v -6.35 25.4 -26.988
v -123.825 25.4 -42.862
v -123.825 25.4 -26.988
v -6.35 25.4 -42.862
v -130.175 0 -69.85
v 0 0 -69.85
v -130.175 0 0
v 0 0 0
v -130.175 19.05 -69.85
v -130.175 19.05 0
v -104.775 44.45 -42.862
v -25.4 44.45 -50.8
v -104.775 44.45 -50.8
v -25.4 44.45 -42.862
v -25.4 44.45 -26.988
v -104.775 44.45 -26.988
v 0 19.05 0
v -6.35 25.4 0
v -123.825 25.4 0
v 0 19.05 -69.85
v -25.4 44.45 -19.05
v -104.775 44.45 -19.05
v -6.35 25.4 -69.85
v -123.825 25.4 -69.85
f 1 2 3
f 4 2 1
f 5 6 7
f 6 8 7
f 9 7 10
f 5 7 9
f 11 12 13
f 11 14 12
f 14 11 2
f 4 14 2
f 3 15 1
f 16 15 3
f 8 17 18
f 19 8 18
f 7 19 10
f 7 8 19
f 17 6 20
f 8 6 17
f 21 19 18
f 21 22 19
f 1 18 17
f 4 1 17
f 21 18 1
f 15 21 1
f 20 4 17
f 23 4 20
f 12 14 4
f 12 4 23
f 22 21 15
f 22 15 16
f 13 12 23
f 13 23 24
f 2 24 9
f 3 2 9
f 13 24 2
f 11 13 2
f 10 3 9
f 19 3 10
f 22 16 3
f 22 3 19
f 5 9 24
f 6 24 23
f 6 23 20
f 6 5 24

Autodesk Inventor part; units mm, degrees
ref_plane "YZ Plane" through (0, 0, 0) normal (1, 0, 0) x (0, 1, 0)
ref_plane "XZ Plane" through (0, 0, 0) normal (0, 1, 0) x (-1, 0, 0)
ref_plane "XY Plane" through (0, 0, 0) normal (0, 0, 1) x (1, 0, 0)
sketch "Sketch1" plane through (0, 0, 0) normal (0, 1, 0) x (-1, 0, 0)
  line L0 (0, 0) -> (130.175, 0)
  line L1 (130.175, 0) -> (130.175, -69.85)
  line L2 (130.175, -69.85) -> (0, -69.85)
  line L3 (0, -69.85) -> (0, 0)
  dimension "d0" = 130.175
  dimension "d1" = 69.85
extrude "Extrusion1" add sketch "Sketch1" along normal blind 44.45
sketch "Sketch2" plane through (0, 44.45, 0) normal (0, 1, 0) x (1, 0, 0)
  line L0 (0, 0) -> (0, 69.85) projected
  line L1 (0, 0) -> (0, 34.925)
  line L2 (0, 34.925) -> (-130.175, 34.925)
  line L3 (-130.175, 69.85) -> (-130.175, 0) projected
  line L4 (-130.175, 34.925) -> (0, 34.925)
  line L5 (0, 34.925) -> (0, 26.9875)
  line L6 (0, 26.9875) -> (-130.175, 26.9875)
  line L7 (-130.175, 26.9875) -> (-130.175, 34.925)
  line L8 (0, 26.9875) -> (-25.3296, 26.9875)
  line L9 (-25.3296, 26.9875) -> (-25.3296, 42.8625)
  line L10 (-25.3296, 42.8625) -> (0, 42.8625)
  line L11 (0, 42.8625) -> (0, 26.9875)
  line L12 (0, 26.9875) -> (-130.175, 26.9875)
  line L13 (-130.175, 26.9875) -> (-130.175, 42.8625)
  line L14 (-130.175, 42.8625) -> (0, 42.8625)
  line L15 (0, 42.8625) -> (0, 26.9875)
  dimension "d4" = 7.9375
  dimension "d5" = 15.875
extrude "Extrusion2" cut sketch "Sketch2" against normal blind 19.05
chamfer "Chamfer1" distance 25.4 angle 45 2 edges at (0, 44.45, -13.4937) (-130.175, 44.45, -13.4938)
chamfer "Chamfer2" distance 19.05 angle 45 2 edges at (-65.0875, 44.45, 0) (-65.0875, 44.45, -69.85)
properties part number "Block" material "Steel, Mild"
